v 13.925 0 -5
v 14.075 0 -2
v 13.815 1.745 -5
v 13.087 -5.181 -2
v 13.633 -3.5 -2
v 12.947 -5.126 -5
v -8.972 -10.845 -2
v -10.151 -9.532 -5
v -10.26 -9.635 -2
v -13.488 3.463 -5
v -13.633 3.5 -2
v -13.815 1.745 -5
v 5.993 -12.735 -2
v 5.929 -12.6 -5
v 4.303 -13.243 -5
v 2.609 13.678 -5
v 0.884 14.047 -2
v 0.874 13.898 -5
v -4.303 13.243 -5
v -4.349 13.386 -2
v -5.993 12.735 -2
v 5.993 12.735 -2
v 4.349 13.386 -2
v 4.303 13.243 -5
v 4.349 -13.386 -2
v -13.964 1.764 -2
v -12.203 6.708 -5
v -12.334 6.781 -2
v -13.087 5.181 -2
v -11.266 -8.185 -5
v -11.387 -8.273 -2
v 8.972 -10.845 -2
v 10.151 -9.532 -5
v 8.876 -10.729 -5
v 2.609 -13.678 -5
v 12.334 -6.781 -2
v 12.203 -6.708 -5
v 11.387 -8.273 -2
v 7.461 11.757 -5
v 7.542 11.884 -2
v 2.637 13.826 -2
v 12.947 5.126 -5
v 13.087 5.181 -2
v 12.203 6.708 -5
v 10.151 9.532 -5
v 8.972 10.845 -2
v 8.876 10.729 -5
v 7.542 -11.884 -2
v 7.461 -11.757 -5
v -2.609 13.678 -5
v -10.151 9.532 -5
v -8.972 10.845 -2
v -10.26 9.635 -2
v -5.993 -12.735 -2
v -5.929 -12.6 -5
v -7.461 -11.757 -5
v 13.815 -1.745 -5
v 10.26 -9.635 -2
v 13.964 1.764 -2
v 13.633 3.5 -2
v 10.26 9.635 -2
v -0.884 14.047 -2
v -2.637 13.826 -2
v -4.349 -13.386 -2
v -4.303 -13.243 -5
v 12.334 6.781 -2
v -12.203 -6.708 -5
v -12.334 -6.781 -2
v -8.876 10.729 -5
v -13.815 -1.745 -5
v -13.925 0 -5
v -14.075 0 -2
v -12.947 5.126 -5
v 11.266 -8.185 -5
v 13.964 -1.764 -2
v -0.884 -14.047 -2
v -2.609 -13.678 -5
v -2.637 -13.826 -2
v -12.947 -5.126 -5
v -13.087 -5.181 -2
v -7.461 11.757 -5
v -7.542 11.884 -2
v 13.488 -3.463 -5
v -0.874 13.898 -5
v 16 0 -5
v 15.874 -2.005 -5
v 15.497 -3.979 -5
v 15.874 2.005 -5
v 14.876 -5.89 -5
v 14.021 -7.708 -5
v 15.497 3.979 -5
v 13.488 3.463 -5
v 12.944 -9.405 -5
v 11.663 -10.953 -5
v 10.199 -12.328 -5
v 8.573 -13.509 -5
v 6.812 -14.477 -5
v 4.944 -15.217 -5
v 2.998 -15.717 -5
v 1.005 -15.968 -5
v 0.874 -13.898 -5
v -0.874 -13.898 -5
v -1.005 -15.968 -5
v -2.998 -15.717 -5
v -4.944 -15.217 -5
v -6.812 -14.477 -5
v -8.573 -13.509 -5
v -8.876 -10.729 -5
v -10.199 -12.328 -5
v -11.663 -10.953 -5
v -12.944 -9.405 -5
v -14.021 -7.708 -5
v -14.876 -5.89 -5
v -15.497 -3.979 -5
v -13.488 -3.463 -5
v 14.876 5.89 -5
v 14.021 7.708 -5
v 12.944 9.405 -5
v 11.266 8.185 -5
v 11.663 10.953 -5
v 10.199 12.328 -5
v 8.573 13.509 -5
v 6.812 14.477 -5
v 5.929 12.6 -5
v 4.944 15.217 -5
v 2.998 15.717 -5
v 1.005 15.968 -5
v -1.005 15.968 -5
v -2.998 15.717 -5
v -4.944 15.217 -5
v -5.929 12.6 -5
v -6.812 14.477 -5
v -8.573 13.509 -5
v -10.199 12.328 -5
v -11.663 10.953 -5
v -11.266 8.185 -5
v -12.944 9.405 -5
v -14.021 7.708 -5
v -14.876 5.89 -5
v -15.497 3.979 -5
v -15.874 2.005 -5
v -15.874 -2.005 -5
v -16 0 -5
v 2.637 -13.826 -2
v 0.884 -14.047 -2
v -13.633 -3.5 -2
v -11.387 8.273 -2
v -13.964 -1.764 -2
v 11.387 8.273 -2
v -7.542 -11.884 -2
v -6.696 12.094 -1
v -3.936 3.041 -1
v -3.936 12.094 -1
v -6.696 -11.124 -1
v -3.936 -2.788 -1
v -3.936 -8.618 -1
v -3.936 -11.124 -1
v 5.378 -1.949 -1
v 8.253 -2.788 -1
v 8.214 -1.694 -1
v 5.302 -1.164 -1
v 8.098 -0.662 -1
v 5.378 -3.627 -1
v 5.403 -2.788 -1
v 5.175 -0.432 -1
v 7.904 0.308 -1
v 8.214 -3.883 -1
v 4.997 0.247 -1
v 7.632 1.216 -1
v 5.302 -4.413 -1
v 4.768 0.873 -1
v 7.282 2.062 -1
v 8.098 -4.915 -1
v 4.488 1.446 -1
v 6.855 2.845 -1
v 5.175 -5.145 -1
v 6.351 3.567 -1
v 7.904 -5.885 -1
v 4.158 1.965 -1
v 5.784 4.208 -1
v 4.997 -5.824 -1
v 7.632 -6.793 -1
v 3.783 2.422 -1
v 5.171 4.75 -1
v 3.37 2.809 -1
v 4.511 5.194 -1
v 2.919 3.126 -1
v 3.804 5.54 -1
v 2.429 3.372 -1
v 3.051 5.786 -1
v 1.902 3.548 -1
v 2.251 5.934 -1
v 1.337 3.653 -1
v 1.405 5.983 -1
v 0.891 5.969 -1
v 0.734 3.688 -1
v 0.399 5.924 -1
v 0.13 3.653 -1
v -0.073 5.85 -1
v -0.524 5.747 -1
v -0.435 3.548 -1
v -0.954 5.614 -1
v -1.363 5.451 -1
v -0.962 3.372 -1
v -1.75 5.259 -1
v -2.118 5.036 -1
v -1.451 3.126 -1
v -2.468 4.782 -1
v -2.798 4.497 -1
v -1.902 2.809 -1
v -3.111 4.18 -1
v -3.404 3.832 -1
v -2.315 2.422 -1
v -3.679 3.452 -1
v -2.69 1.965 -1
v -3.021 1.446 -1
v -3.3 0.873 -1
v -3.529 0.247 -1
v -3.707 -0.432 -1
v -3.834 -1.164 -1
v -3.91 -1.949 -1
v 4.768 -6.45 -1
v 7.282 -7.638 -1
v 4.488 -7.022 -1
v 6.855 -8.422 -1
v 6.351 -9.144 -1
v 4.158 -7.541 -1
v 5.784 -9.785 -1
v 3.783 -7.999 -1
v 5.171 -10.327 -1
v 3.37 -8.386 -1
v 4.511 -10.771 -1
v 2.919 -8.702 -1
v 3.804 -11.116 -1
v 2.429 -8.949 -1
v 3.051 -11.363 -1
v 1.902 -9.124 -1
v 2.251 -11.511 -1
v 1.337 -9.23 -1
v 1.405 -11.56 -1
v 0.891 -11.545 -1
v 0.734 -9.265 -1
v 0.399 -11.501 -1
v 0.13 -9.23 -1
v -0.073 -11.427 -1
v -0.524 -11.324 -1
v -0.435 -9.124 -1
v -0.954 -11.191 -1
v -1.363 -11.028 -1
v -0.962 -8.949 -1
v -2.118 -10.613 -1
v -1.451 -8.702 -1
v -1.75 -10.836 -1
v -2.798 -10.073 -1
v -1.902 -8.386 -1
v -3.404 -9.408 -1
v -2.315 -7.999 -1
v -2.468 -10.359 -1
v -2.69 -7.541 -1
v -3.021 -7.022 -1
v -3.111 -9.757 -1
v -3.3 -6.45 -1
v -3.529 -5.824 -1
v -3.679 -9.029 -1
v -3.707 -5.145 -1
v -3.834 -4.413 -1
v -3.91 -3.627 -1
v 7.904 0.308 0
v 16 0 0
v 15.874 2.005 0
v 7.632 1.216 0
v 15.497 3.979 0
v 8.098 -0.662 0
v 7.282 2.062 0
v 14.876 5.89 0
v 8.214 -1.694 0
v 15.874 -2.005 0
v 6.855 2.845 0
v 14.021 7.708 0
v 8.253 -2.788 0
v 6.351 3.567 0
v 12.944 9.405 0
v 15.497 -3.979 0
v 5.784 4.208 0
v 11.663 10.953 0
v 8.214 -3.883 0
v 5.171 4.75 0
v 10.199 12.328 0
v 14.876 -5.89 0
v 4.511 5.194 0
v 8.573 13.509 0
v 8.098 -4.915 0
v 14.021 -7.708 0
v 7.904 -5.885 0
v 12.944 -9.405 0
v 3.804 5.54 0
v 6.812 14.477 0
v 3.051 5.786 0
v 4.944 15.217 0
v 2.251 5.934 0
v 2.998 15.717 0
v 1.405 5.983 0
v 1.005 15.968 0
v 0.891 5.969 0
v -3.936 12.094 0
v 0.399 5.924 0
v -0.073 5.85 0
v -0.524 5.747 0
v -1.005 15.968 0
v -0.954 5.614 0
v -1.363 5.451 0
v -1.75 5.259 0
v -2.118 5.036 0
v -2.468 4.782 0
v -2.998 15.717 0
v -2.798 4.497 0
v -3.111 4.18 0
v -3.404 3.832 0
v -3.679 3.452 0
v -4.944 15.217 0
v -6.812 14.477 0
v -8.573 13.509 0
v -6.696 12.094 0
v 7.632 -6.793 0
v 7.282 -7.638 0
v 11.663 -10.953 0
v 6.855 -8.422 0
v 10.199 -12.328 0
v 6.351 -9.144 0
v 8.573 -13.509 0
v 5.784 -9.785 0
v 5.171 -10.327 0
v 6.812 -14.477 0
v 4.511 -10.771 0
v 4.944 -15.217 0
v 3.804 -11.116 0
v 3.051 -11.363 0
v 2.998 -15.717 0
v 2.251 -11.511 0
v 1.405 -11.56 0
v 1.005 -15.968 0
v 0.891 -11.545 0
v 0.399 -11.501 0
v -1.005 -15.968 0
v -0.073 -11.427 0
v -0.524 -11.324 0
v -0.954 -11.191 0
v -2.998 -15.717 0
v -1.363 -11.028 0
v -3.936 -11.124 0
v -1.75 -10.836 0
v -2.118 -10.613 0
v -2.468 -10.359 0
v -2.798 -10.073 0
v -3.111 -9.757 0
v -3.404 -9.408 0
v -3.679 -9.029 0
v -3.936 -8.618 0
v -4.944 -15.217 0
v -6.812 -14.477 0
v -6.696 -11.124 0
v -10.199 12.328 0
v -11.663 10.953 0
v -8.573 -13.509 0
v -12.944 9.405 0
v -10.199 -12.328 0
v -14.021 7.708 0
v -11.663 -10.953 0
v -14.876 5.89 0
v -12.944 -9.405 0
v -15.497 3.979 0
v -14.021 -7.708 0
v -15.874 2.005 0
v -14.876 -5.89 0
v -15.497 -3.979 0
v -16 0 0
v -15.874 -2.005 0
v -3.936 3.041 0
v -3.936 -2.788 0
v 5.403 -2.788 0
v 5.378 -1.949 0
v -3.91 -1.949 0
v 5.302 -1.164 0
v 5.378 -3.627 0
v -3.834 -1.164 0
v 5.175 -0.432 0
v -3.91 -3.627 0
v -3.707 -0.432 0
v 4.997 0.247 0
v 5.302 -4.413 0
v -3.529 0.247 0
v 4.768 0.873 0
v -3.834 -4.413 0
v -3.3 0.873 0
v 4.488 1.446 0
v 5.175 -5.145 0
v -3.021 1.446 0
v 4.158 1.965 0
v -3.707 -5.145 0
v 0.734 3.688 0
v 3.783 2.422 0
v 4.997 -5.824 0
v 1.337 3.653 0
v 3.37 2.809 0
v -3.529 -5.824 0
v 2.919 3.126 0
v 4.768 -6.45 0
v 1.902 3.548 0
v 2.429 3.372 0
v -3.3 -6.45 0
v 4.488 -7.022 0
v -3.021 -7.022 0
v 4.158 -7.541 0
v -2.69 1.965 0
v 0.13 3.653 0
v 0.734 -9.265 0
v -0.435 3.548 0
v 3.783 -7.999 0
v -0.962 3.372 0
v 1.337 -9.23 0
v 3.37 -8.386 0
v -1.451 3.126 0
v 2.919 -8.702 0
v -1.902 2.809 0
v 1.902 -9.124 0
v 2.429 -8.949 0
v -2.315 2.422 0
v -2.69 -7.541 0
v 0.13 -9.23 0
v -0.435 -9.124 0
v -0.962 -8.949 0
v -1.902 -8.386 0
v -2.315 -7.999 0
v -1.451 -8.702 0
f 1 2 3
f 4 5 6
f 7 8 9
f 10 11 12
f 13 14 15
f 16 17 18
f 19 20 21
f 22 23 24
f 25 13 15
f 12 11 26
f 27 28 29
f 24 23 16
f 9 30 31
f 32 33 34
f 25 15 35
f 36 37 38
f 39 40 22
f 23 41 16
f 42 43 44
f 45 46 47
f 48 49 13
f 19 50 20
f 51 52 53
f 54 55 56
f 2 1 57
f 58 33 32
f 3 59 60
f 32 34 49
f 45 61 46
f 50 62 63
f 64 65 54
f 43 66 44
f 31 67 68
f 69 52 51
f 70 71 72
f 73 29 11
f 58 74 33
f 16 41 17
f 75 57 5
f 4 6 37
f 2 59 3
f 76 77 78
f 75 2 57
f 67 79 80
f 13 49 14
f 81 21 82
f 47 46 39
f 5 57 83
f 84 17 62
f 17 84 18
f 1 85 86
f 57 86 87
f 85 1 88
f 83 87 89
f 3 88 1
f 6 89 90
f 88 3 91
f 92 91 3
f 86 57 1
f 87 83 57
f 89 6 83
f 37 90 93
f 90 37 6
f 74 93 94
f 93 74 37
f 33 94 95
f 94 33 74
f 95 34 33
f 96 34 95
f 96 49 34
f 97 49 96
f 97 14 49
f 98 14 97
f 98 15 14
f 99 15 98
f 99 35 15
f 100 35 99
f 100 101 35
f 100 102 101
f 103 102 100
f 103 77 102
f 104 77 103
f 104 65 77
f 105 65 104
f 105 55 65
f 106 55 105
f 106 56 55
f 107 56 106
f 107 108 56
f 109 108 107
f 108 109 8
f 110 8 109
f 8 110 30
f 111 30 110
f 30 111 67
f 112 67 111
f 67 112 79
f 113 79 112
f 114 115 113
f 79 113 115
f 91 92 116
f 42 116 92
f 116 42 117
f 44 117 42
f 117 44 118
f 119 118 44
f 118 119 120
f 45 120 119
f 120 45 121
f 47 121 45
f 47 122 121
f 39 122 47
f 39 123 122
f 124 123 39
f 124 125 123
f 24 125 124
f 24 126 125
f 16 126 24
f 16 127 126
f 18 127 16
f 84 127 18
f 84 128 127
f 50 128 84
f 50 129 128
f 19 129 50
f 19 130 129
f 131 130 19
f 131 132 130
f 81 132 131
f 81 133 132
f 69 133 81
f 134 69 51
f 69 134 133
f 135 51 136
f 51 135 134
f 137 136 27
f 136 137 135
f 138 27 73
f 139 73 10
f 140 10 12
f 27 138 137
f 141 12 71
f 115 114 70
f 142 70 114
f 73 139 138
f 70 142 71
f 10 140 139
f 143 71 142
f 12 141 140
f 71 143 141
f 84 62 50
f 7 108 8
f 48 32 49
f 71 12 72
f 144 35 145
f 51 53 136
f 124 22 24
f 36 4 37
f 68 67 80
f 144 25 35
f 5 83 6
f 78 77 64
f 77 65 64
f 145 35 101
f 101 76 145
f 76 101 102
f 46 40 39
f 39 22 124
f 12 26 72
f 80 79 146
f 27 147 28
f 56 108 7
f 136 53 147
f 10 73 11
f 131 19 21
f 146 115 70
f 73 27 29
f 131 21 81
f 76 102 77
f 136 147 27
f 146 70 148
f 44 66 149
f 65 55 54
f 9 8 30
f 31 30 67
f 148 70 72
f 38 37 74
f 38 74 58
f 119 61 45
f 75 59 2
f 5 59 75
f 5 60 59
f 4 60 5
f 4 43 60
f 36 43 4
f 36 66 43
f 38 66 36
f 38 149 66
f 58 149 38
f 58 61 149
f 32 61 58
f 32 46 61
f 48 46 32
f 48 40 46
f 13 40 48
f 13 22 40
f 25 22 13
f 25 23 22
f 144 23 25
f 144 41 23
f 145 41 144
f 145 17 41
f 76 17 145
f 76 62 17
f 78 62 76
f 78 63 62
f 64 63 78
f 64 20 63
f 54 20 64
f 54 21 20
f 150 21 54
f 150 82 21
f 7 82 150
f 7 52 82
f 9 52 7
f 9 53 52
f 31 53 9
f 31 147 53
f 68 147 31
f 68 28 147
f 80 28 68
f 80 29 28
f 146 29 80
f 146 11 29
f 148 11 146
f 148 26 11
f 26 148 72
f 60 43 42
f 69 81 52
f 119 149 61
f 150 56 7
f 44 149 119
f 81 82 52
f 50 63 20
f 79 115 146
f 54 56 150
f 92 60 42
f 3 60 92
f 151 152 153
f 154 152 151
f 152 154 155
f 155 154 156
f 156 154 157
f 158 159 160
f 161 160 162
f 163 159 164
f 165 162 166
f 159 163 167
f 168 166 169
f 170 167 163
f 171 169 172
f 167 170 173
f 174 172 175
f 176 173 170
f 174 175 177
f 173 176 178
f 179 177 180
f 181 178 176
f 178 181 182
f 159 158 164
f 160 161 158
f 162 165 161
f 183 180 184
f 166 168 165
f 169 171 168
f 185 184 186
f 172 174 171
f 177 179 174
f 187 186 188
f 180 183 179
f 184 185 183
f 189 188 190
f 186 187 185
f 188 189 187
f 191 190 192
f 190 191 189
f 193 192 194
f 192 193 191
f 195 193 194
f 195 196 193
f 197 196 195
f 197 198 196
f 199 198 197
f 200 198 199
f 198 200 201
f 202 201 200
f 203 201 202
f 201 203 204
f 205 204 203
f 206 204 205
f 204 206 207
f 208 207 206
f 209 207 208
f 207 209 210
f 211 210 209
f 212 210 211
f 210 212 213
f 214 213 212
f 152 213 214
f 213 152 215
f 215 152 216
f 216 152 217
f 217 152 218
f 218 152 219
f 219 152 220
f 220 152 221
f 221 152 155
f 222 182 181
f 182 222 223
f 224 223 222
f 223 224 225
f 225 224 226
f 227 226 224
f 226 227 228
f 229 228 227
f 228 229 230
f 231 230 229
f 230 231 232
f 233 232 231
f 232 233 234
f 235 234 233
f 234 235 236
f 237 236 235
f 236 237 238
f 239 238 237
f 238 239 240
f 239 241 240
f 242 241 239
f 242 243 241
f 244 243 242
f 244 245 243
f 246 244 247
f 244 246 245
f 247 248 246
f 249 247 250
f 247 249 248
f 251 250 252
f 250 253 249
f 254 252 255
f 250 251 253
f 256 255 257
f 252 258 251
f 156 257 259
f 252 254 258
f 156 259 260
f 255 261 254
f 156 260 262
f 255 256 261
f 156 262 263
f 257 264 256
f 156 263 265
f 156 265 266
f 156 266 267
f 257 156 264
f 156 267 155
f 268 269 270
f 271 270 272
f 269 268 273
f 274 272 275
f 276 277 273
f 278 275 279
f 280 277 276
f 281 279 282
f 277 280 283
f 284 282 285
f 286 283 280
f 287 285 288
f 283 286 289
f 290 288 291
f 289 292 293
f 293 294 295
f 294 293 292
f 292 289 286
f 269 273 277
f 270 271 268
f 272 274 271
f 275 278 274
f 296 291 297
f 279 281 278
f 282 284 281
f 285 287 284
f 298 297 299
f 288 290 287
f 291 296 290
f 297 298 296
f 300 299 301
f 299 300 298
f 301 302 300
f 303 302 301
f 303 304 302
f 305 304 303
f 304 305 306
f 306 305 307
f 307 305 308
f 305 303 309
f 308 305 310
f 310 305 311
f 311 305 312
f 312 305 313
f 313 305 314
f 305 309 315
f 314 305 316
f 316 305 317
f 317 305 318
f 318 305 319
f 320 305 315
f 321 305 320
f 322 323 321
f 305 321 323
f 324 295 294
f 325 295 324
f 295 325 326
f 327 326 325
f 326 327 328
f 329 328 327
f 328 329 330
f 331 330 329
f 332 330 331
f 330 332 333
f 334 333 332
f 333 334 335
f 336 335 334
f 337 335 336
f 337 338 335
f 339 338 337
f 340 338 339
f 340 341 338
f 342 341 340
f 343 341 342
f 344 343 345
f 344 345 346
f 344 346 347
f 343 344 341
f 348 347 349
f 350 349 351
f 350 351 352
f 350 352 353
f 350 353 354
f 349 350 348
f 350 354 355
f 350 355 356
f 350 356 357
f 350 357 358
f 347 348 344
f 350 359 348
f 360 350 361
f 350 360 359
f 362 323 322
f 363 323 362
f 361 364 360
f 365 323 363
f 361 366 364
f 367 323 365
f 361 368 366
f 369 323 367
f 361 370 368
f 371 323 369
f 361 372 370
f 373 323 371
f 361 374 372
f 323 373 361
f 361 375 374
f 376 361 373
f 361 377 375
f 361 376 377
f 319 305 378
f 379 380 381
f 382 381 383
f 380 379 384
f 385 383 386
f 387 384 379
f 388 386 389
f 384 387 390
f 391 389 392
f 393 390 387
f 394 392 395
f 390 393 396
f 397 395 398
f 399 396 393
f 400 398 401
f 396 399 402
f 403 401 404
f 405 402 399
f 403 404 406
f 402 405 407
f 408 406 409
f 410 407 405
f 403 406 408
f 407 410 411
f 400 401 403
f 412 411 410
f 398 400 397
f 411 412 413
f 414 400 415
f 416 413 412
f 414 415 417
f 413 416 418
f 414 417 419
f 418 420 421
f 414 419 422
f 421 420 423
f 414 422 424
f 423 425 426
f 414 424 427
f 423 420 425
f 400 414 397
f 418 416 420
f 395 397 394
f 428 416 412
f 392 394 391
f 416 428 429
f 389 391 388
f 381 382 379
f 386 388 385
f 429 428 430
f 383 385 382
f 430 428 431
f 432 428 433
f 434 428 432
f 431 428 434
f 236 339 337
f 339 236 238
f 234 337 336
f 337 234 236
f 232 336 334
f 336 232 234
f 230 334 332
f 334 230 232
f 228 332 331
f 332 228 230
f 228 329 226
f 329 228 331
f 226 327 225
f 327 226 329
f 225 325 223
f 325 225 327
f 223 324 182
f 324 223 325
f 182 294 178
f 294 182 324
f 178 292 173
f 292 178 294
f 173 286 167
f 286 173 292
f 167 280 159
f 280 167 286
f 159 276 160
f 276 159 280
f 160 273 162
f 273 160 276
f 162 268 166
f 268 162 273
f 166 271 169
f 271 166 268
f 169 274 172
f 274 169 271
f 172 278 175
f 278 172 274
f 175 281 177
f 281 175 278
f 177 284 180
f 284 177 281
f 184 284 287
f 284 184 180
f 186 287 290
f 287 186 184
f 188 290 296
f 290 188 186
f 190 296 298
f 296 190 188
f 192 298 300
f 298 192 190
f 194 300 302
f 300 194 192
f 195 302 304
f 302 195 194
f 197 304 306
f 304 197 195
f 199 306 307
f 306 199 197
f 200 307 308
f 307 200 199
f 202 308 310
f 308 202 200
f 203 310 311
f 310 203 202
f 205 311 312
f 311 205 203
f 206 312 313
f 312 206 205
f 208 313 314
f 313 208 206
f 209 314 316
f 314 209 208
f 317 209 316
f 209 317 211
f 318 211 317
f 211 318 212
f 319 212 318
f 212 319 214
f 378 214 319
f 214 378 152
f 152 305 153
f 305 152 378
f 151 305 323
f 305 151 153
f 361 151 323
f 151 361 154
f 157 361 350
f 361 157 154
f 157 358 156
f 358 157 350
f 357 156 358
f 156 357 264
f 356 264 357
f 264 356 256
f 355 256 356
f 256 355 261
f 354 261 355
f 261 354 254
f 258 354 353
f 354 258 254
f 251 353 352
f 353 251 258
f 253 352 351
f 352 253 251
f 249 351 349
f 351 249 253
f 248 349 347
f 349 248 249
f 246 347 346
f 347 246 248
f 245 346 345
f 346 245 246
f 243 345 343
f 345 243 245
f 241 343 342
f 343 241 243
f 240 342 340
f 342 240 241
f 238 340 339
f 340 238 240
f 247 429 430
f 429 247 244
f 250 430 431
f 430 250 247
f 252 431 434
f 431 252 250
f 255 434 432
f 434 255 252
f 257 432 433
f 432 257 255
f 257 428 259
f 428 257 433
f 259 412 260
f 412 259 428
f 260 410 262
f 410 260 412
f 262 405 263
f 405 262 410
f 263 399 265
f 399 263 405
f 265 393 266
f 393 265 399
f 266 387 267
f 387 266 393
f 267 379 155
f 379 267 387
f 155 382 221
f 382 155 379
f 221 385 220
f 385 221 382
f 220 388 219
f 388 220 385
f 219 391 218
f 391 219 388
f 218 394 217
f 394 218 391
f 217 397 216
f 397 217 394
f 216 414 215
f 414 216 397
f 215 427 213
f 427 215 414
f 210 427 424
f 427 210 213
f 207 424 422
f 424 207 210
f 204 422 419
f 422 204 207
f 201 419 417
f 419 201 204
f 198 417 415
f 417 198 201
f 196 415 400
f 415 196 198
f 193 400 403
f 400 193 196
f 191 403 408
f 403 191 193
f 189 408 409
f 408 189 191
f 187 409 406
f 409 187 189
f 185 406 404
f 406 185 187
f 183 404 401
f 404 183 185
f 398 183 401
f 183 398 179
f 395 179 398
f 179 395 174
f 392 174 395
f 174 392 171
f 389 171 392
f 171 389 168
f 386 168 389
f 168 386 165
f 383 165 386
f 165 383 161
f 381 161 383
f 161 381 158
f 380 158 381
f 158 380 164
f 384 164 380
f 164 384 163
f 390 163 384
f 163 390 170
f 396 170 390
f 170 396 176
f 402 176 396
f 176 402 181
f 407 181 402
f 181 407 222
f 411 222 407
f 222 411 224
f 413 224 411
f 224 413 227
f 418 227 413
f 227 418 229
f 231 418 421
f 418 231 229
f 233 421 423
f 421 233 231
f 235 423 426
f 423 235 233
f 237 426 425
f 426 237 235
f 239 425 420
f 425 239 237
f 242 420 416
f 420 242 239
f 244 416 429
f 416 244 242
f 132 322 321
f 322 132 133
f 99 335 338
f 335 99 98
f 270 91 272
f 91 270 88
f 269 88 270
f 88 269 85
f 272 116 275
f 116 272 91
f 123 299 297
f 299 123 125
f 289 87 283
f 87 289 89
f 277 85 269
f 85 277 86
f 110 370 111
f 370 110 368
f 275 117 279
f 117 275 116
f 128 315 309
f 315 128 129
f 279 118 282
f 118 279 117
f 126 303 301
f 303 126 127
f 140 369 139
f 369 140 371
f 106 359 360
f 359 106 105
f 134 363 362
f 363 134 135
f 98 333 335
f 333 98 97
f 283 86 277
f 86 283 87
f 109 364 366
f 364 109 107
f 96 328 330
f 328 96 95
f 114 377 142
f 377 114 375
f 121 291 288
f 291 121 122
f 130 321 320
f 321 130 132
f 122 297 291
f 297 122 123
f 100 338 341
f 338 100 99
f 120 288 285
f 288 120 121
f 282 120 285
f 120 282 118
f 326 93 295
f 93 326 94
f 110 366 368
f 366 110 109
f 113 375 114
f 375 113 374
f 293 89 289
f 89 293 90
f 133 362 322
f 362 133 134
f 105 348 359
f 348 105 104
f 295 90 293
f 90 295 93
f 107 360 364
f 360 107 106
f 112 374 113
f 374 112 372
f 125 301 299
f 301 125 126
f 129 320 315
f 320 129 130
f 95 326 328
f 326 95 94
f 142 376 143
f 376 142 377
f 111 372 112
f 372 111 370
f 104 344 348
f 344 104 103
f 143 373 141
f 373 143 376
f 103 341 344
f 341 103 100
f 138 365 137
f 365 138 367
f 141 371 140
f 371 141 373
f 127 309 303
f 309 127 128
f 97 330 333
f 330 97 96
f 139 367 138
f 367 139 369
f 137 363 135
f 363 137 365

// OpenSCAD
$fn = 50;


difference() {
	union() {
		translate(v = [0, 0, -5.0000000000]) {
			cylinder(h = 5, r = 16.0000000000);
		}
	}
	union() {
		#translate(v = [0, 0, -5.0000000000]) {
			cylinder(h = 3, r1 = 13.9250000000, r2 = 14.0750000000);
		}
		translate(v = [0, 0, -1]) {
			linear_extrude(height = 1) {
				text(font = "Webdings", halign = "center", size = 22, text = "b", valign = "center");
			}
		}
	}
}
